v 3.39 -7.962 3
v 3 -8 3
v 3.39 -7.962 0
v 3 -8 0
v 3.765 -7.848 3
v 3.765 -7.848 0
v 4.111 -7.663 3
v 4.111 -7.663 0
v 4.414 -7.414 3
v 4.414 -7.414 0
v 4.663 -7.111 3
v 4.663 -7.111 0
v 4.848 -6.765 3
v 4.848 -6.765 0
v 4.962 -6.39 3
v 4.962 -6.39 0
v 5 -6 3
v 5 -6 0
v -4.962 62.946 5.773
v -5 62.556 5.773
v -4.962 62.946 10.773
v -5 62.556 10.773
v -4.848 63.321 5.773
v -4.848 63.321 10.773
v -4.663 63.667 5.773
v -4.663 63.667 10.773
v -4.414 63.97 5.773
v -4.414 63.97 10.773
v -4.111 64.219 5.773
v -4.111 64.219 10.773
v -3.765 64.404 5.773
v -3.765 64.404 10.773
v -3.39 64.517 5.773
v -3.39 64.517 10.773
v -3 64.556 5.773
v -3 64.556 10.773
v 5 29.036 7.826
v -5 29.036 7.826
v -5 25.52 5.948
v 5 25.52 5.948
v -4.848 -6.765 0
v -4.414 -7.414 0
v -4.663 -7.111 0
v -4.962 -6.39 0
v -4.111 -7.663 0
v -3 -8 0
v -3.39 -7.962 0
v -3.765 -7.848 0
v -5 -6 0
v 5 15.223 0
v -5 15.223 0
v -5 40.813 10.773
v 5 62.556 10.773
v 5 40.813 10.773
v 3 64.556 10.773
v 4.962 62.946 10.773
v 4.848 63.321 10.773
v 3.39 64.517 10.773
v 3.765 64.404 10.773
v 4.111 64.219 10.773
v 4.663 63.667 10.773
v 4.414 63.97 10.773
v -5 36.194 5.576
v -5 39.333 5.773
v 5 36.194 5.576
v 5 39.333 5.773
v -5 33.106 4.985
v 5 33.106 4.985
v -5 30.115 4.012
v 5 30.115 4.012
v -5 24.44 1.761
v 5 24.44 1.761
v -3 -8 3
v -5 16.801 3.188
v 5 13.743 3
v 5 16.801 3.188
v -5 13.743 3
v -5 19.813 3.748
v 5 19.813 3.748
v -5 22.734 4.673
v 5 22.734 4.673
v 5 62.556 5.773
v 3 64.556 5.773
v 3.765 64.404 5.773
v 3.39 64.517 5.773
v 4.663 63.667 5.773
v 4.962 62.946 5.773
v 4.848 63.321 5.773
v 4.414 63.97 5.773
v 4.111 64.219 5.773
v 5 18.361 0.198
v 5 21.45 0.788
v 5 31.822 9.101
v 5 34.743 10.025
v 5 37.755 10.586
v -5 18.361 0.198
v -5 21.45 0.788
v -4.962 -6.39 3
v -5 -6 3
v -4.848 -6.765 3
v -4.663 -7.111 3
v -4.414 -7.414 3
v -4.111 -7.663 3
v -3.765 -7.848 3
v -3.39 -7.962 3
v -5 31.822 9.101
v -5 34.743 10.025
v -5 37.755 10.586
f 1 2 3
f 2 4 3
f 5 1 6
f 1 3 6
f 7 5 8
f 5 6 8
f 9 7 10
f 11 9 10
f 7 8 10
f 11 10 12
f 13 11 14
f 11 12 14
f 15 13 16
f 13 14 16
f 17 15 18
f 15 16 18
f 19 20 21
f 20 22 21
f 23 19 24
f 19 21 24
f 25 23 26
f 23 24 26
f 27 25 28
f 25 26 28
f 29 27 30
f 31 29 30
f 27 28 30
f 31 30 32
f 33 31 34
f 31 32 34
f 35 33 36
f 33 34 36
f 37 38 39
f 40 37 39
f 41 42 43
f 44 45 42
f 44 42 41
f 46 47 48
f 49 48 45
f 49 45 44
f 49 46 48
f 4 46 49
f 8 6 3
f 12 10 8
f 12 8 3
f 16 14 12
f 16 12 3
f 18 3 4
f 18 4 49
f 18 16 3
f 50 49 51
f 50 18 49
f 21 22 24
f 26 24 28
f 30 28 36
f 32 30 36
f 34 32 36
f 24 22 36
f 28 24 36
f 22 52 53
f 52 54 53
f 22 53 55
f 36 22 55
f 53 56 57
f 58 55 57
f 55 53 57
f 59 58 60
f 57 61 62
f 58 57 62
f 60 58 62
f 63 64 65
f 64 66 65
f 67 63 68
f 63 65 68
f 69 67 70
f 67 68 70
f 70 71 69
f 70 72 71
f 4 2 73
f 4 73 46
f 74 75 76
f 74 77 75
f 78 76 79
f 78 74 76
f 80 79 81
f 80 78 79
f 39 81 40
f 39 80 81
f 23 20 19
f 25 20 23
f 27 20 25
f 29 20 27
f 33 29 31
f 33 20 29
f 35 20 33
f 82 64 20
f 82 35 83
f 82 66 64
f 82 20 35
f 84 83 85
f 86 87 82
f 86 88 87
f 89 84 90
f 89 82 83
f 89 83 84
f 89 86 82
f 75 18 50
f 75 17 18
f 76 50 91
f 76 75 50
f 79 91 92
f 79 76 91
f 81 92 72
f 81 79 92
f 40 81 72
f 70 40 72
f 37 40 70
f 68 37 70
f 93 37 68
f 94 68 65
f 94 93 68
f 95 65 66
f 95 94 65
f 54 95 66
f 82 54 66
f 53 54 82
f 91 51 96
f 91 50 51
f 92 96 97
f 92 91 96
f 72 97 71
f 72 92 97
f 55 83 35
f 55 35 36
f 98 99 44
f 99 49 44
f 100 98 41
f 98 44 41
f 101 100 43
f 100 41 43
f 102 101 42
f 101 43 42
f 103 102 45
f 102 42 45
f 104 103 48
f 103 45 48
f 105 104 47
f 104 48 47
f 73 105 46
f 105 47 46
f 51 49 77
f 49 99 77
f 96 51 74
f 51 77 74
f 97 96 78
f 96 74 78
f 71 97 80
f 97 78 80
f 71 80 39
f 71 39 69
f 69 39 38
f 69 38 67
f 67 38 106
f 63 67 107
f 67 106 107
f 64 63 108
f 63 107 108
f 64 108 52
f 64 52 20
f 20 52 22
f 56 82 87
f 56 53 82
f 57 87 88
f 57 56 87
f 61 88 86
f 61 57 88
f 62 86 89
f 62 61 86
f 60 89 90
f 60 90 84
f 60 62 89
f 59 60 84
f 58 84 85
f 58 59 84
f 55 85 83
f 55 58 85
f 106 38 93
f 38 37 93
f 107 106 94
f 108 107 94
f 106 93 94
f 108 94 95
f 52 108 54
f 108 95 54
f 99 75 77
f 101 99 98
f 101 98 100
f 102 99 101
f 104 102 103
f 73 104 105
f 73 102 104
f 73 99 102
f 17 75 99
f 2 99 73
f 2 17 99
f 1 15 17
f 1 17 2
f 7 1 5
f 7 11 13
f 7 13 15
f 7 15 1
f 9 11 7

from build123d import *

# Parameters (mm, degrees)
F0_W     = 30
F0_H     = 5
F1_DEPTH = 5
F2_R     = 25
F3_R     = 2


# Not quite as in the source:
# - a feature names something its author has since deleted; it is built from what else it names


with BuildPart() as f1:
    # F0 (on Right) → F1 (new body, symmetric)
    with BuildSketch(Plane.YZ):
        Polygon((-8, 0), (0, 0), (20, 0), (20, 3), (0, 3), (-8, 3), align=None)
        Polygon((20, 3), (20, 0), (34.5558710396, 5.7734296471), (34.5558710396, 10.7734296471), align=None)
        with Locations((49.5558710396, 8.2734296471)):
            Rectangle(F0_W, F0_H)
    extrude(amount=F1_DEPTH, both=True)

    # F2
    f2_edges = [f1.edges().sort_by_distance(p)[0] for p in [
        (0, 20, 3),
        (0, 34.555871, 10.77343),
        (0, 34.555871, 5.77343),
        (0, 20, 0),
    ]]
    fillet(f2_edges, radius=F2_R)

    # F3
    f3_edges = [f1.edges().sort_by_distance(p)[0] for p in [
        (5, 64.555871, 8.27343),
        (-5, 64.555871, 8.27343),
        (5, -8, 1.5),
        (-5, -8, 1.5),
    ]]
    fillet(f3_edges, radius=F3_R)


solid = f1.part
